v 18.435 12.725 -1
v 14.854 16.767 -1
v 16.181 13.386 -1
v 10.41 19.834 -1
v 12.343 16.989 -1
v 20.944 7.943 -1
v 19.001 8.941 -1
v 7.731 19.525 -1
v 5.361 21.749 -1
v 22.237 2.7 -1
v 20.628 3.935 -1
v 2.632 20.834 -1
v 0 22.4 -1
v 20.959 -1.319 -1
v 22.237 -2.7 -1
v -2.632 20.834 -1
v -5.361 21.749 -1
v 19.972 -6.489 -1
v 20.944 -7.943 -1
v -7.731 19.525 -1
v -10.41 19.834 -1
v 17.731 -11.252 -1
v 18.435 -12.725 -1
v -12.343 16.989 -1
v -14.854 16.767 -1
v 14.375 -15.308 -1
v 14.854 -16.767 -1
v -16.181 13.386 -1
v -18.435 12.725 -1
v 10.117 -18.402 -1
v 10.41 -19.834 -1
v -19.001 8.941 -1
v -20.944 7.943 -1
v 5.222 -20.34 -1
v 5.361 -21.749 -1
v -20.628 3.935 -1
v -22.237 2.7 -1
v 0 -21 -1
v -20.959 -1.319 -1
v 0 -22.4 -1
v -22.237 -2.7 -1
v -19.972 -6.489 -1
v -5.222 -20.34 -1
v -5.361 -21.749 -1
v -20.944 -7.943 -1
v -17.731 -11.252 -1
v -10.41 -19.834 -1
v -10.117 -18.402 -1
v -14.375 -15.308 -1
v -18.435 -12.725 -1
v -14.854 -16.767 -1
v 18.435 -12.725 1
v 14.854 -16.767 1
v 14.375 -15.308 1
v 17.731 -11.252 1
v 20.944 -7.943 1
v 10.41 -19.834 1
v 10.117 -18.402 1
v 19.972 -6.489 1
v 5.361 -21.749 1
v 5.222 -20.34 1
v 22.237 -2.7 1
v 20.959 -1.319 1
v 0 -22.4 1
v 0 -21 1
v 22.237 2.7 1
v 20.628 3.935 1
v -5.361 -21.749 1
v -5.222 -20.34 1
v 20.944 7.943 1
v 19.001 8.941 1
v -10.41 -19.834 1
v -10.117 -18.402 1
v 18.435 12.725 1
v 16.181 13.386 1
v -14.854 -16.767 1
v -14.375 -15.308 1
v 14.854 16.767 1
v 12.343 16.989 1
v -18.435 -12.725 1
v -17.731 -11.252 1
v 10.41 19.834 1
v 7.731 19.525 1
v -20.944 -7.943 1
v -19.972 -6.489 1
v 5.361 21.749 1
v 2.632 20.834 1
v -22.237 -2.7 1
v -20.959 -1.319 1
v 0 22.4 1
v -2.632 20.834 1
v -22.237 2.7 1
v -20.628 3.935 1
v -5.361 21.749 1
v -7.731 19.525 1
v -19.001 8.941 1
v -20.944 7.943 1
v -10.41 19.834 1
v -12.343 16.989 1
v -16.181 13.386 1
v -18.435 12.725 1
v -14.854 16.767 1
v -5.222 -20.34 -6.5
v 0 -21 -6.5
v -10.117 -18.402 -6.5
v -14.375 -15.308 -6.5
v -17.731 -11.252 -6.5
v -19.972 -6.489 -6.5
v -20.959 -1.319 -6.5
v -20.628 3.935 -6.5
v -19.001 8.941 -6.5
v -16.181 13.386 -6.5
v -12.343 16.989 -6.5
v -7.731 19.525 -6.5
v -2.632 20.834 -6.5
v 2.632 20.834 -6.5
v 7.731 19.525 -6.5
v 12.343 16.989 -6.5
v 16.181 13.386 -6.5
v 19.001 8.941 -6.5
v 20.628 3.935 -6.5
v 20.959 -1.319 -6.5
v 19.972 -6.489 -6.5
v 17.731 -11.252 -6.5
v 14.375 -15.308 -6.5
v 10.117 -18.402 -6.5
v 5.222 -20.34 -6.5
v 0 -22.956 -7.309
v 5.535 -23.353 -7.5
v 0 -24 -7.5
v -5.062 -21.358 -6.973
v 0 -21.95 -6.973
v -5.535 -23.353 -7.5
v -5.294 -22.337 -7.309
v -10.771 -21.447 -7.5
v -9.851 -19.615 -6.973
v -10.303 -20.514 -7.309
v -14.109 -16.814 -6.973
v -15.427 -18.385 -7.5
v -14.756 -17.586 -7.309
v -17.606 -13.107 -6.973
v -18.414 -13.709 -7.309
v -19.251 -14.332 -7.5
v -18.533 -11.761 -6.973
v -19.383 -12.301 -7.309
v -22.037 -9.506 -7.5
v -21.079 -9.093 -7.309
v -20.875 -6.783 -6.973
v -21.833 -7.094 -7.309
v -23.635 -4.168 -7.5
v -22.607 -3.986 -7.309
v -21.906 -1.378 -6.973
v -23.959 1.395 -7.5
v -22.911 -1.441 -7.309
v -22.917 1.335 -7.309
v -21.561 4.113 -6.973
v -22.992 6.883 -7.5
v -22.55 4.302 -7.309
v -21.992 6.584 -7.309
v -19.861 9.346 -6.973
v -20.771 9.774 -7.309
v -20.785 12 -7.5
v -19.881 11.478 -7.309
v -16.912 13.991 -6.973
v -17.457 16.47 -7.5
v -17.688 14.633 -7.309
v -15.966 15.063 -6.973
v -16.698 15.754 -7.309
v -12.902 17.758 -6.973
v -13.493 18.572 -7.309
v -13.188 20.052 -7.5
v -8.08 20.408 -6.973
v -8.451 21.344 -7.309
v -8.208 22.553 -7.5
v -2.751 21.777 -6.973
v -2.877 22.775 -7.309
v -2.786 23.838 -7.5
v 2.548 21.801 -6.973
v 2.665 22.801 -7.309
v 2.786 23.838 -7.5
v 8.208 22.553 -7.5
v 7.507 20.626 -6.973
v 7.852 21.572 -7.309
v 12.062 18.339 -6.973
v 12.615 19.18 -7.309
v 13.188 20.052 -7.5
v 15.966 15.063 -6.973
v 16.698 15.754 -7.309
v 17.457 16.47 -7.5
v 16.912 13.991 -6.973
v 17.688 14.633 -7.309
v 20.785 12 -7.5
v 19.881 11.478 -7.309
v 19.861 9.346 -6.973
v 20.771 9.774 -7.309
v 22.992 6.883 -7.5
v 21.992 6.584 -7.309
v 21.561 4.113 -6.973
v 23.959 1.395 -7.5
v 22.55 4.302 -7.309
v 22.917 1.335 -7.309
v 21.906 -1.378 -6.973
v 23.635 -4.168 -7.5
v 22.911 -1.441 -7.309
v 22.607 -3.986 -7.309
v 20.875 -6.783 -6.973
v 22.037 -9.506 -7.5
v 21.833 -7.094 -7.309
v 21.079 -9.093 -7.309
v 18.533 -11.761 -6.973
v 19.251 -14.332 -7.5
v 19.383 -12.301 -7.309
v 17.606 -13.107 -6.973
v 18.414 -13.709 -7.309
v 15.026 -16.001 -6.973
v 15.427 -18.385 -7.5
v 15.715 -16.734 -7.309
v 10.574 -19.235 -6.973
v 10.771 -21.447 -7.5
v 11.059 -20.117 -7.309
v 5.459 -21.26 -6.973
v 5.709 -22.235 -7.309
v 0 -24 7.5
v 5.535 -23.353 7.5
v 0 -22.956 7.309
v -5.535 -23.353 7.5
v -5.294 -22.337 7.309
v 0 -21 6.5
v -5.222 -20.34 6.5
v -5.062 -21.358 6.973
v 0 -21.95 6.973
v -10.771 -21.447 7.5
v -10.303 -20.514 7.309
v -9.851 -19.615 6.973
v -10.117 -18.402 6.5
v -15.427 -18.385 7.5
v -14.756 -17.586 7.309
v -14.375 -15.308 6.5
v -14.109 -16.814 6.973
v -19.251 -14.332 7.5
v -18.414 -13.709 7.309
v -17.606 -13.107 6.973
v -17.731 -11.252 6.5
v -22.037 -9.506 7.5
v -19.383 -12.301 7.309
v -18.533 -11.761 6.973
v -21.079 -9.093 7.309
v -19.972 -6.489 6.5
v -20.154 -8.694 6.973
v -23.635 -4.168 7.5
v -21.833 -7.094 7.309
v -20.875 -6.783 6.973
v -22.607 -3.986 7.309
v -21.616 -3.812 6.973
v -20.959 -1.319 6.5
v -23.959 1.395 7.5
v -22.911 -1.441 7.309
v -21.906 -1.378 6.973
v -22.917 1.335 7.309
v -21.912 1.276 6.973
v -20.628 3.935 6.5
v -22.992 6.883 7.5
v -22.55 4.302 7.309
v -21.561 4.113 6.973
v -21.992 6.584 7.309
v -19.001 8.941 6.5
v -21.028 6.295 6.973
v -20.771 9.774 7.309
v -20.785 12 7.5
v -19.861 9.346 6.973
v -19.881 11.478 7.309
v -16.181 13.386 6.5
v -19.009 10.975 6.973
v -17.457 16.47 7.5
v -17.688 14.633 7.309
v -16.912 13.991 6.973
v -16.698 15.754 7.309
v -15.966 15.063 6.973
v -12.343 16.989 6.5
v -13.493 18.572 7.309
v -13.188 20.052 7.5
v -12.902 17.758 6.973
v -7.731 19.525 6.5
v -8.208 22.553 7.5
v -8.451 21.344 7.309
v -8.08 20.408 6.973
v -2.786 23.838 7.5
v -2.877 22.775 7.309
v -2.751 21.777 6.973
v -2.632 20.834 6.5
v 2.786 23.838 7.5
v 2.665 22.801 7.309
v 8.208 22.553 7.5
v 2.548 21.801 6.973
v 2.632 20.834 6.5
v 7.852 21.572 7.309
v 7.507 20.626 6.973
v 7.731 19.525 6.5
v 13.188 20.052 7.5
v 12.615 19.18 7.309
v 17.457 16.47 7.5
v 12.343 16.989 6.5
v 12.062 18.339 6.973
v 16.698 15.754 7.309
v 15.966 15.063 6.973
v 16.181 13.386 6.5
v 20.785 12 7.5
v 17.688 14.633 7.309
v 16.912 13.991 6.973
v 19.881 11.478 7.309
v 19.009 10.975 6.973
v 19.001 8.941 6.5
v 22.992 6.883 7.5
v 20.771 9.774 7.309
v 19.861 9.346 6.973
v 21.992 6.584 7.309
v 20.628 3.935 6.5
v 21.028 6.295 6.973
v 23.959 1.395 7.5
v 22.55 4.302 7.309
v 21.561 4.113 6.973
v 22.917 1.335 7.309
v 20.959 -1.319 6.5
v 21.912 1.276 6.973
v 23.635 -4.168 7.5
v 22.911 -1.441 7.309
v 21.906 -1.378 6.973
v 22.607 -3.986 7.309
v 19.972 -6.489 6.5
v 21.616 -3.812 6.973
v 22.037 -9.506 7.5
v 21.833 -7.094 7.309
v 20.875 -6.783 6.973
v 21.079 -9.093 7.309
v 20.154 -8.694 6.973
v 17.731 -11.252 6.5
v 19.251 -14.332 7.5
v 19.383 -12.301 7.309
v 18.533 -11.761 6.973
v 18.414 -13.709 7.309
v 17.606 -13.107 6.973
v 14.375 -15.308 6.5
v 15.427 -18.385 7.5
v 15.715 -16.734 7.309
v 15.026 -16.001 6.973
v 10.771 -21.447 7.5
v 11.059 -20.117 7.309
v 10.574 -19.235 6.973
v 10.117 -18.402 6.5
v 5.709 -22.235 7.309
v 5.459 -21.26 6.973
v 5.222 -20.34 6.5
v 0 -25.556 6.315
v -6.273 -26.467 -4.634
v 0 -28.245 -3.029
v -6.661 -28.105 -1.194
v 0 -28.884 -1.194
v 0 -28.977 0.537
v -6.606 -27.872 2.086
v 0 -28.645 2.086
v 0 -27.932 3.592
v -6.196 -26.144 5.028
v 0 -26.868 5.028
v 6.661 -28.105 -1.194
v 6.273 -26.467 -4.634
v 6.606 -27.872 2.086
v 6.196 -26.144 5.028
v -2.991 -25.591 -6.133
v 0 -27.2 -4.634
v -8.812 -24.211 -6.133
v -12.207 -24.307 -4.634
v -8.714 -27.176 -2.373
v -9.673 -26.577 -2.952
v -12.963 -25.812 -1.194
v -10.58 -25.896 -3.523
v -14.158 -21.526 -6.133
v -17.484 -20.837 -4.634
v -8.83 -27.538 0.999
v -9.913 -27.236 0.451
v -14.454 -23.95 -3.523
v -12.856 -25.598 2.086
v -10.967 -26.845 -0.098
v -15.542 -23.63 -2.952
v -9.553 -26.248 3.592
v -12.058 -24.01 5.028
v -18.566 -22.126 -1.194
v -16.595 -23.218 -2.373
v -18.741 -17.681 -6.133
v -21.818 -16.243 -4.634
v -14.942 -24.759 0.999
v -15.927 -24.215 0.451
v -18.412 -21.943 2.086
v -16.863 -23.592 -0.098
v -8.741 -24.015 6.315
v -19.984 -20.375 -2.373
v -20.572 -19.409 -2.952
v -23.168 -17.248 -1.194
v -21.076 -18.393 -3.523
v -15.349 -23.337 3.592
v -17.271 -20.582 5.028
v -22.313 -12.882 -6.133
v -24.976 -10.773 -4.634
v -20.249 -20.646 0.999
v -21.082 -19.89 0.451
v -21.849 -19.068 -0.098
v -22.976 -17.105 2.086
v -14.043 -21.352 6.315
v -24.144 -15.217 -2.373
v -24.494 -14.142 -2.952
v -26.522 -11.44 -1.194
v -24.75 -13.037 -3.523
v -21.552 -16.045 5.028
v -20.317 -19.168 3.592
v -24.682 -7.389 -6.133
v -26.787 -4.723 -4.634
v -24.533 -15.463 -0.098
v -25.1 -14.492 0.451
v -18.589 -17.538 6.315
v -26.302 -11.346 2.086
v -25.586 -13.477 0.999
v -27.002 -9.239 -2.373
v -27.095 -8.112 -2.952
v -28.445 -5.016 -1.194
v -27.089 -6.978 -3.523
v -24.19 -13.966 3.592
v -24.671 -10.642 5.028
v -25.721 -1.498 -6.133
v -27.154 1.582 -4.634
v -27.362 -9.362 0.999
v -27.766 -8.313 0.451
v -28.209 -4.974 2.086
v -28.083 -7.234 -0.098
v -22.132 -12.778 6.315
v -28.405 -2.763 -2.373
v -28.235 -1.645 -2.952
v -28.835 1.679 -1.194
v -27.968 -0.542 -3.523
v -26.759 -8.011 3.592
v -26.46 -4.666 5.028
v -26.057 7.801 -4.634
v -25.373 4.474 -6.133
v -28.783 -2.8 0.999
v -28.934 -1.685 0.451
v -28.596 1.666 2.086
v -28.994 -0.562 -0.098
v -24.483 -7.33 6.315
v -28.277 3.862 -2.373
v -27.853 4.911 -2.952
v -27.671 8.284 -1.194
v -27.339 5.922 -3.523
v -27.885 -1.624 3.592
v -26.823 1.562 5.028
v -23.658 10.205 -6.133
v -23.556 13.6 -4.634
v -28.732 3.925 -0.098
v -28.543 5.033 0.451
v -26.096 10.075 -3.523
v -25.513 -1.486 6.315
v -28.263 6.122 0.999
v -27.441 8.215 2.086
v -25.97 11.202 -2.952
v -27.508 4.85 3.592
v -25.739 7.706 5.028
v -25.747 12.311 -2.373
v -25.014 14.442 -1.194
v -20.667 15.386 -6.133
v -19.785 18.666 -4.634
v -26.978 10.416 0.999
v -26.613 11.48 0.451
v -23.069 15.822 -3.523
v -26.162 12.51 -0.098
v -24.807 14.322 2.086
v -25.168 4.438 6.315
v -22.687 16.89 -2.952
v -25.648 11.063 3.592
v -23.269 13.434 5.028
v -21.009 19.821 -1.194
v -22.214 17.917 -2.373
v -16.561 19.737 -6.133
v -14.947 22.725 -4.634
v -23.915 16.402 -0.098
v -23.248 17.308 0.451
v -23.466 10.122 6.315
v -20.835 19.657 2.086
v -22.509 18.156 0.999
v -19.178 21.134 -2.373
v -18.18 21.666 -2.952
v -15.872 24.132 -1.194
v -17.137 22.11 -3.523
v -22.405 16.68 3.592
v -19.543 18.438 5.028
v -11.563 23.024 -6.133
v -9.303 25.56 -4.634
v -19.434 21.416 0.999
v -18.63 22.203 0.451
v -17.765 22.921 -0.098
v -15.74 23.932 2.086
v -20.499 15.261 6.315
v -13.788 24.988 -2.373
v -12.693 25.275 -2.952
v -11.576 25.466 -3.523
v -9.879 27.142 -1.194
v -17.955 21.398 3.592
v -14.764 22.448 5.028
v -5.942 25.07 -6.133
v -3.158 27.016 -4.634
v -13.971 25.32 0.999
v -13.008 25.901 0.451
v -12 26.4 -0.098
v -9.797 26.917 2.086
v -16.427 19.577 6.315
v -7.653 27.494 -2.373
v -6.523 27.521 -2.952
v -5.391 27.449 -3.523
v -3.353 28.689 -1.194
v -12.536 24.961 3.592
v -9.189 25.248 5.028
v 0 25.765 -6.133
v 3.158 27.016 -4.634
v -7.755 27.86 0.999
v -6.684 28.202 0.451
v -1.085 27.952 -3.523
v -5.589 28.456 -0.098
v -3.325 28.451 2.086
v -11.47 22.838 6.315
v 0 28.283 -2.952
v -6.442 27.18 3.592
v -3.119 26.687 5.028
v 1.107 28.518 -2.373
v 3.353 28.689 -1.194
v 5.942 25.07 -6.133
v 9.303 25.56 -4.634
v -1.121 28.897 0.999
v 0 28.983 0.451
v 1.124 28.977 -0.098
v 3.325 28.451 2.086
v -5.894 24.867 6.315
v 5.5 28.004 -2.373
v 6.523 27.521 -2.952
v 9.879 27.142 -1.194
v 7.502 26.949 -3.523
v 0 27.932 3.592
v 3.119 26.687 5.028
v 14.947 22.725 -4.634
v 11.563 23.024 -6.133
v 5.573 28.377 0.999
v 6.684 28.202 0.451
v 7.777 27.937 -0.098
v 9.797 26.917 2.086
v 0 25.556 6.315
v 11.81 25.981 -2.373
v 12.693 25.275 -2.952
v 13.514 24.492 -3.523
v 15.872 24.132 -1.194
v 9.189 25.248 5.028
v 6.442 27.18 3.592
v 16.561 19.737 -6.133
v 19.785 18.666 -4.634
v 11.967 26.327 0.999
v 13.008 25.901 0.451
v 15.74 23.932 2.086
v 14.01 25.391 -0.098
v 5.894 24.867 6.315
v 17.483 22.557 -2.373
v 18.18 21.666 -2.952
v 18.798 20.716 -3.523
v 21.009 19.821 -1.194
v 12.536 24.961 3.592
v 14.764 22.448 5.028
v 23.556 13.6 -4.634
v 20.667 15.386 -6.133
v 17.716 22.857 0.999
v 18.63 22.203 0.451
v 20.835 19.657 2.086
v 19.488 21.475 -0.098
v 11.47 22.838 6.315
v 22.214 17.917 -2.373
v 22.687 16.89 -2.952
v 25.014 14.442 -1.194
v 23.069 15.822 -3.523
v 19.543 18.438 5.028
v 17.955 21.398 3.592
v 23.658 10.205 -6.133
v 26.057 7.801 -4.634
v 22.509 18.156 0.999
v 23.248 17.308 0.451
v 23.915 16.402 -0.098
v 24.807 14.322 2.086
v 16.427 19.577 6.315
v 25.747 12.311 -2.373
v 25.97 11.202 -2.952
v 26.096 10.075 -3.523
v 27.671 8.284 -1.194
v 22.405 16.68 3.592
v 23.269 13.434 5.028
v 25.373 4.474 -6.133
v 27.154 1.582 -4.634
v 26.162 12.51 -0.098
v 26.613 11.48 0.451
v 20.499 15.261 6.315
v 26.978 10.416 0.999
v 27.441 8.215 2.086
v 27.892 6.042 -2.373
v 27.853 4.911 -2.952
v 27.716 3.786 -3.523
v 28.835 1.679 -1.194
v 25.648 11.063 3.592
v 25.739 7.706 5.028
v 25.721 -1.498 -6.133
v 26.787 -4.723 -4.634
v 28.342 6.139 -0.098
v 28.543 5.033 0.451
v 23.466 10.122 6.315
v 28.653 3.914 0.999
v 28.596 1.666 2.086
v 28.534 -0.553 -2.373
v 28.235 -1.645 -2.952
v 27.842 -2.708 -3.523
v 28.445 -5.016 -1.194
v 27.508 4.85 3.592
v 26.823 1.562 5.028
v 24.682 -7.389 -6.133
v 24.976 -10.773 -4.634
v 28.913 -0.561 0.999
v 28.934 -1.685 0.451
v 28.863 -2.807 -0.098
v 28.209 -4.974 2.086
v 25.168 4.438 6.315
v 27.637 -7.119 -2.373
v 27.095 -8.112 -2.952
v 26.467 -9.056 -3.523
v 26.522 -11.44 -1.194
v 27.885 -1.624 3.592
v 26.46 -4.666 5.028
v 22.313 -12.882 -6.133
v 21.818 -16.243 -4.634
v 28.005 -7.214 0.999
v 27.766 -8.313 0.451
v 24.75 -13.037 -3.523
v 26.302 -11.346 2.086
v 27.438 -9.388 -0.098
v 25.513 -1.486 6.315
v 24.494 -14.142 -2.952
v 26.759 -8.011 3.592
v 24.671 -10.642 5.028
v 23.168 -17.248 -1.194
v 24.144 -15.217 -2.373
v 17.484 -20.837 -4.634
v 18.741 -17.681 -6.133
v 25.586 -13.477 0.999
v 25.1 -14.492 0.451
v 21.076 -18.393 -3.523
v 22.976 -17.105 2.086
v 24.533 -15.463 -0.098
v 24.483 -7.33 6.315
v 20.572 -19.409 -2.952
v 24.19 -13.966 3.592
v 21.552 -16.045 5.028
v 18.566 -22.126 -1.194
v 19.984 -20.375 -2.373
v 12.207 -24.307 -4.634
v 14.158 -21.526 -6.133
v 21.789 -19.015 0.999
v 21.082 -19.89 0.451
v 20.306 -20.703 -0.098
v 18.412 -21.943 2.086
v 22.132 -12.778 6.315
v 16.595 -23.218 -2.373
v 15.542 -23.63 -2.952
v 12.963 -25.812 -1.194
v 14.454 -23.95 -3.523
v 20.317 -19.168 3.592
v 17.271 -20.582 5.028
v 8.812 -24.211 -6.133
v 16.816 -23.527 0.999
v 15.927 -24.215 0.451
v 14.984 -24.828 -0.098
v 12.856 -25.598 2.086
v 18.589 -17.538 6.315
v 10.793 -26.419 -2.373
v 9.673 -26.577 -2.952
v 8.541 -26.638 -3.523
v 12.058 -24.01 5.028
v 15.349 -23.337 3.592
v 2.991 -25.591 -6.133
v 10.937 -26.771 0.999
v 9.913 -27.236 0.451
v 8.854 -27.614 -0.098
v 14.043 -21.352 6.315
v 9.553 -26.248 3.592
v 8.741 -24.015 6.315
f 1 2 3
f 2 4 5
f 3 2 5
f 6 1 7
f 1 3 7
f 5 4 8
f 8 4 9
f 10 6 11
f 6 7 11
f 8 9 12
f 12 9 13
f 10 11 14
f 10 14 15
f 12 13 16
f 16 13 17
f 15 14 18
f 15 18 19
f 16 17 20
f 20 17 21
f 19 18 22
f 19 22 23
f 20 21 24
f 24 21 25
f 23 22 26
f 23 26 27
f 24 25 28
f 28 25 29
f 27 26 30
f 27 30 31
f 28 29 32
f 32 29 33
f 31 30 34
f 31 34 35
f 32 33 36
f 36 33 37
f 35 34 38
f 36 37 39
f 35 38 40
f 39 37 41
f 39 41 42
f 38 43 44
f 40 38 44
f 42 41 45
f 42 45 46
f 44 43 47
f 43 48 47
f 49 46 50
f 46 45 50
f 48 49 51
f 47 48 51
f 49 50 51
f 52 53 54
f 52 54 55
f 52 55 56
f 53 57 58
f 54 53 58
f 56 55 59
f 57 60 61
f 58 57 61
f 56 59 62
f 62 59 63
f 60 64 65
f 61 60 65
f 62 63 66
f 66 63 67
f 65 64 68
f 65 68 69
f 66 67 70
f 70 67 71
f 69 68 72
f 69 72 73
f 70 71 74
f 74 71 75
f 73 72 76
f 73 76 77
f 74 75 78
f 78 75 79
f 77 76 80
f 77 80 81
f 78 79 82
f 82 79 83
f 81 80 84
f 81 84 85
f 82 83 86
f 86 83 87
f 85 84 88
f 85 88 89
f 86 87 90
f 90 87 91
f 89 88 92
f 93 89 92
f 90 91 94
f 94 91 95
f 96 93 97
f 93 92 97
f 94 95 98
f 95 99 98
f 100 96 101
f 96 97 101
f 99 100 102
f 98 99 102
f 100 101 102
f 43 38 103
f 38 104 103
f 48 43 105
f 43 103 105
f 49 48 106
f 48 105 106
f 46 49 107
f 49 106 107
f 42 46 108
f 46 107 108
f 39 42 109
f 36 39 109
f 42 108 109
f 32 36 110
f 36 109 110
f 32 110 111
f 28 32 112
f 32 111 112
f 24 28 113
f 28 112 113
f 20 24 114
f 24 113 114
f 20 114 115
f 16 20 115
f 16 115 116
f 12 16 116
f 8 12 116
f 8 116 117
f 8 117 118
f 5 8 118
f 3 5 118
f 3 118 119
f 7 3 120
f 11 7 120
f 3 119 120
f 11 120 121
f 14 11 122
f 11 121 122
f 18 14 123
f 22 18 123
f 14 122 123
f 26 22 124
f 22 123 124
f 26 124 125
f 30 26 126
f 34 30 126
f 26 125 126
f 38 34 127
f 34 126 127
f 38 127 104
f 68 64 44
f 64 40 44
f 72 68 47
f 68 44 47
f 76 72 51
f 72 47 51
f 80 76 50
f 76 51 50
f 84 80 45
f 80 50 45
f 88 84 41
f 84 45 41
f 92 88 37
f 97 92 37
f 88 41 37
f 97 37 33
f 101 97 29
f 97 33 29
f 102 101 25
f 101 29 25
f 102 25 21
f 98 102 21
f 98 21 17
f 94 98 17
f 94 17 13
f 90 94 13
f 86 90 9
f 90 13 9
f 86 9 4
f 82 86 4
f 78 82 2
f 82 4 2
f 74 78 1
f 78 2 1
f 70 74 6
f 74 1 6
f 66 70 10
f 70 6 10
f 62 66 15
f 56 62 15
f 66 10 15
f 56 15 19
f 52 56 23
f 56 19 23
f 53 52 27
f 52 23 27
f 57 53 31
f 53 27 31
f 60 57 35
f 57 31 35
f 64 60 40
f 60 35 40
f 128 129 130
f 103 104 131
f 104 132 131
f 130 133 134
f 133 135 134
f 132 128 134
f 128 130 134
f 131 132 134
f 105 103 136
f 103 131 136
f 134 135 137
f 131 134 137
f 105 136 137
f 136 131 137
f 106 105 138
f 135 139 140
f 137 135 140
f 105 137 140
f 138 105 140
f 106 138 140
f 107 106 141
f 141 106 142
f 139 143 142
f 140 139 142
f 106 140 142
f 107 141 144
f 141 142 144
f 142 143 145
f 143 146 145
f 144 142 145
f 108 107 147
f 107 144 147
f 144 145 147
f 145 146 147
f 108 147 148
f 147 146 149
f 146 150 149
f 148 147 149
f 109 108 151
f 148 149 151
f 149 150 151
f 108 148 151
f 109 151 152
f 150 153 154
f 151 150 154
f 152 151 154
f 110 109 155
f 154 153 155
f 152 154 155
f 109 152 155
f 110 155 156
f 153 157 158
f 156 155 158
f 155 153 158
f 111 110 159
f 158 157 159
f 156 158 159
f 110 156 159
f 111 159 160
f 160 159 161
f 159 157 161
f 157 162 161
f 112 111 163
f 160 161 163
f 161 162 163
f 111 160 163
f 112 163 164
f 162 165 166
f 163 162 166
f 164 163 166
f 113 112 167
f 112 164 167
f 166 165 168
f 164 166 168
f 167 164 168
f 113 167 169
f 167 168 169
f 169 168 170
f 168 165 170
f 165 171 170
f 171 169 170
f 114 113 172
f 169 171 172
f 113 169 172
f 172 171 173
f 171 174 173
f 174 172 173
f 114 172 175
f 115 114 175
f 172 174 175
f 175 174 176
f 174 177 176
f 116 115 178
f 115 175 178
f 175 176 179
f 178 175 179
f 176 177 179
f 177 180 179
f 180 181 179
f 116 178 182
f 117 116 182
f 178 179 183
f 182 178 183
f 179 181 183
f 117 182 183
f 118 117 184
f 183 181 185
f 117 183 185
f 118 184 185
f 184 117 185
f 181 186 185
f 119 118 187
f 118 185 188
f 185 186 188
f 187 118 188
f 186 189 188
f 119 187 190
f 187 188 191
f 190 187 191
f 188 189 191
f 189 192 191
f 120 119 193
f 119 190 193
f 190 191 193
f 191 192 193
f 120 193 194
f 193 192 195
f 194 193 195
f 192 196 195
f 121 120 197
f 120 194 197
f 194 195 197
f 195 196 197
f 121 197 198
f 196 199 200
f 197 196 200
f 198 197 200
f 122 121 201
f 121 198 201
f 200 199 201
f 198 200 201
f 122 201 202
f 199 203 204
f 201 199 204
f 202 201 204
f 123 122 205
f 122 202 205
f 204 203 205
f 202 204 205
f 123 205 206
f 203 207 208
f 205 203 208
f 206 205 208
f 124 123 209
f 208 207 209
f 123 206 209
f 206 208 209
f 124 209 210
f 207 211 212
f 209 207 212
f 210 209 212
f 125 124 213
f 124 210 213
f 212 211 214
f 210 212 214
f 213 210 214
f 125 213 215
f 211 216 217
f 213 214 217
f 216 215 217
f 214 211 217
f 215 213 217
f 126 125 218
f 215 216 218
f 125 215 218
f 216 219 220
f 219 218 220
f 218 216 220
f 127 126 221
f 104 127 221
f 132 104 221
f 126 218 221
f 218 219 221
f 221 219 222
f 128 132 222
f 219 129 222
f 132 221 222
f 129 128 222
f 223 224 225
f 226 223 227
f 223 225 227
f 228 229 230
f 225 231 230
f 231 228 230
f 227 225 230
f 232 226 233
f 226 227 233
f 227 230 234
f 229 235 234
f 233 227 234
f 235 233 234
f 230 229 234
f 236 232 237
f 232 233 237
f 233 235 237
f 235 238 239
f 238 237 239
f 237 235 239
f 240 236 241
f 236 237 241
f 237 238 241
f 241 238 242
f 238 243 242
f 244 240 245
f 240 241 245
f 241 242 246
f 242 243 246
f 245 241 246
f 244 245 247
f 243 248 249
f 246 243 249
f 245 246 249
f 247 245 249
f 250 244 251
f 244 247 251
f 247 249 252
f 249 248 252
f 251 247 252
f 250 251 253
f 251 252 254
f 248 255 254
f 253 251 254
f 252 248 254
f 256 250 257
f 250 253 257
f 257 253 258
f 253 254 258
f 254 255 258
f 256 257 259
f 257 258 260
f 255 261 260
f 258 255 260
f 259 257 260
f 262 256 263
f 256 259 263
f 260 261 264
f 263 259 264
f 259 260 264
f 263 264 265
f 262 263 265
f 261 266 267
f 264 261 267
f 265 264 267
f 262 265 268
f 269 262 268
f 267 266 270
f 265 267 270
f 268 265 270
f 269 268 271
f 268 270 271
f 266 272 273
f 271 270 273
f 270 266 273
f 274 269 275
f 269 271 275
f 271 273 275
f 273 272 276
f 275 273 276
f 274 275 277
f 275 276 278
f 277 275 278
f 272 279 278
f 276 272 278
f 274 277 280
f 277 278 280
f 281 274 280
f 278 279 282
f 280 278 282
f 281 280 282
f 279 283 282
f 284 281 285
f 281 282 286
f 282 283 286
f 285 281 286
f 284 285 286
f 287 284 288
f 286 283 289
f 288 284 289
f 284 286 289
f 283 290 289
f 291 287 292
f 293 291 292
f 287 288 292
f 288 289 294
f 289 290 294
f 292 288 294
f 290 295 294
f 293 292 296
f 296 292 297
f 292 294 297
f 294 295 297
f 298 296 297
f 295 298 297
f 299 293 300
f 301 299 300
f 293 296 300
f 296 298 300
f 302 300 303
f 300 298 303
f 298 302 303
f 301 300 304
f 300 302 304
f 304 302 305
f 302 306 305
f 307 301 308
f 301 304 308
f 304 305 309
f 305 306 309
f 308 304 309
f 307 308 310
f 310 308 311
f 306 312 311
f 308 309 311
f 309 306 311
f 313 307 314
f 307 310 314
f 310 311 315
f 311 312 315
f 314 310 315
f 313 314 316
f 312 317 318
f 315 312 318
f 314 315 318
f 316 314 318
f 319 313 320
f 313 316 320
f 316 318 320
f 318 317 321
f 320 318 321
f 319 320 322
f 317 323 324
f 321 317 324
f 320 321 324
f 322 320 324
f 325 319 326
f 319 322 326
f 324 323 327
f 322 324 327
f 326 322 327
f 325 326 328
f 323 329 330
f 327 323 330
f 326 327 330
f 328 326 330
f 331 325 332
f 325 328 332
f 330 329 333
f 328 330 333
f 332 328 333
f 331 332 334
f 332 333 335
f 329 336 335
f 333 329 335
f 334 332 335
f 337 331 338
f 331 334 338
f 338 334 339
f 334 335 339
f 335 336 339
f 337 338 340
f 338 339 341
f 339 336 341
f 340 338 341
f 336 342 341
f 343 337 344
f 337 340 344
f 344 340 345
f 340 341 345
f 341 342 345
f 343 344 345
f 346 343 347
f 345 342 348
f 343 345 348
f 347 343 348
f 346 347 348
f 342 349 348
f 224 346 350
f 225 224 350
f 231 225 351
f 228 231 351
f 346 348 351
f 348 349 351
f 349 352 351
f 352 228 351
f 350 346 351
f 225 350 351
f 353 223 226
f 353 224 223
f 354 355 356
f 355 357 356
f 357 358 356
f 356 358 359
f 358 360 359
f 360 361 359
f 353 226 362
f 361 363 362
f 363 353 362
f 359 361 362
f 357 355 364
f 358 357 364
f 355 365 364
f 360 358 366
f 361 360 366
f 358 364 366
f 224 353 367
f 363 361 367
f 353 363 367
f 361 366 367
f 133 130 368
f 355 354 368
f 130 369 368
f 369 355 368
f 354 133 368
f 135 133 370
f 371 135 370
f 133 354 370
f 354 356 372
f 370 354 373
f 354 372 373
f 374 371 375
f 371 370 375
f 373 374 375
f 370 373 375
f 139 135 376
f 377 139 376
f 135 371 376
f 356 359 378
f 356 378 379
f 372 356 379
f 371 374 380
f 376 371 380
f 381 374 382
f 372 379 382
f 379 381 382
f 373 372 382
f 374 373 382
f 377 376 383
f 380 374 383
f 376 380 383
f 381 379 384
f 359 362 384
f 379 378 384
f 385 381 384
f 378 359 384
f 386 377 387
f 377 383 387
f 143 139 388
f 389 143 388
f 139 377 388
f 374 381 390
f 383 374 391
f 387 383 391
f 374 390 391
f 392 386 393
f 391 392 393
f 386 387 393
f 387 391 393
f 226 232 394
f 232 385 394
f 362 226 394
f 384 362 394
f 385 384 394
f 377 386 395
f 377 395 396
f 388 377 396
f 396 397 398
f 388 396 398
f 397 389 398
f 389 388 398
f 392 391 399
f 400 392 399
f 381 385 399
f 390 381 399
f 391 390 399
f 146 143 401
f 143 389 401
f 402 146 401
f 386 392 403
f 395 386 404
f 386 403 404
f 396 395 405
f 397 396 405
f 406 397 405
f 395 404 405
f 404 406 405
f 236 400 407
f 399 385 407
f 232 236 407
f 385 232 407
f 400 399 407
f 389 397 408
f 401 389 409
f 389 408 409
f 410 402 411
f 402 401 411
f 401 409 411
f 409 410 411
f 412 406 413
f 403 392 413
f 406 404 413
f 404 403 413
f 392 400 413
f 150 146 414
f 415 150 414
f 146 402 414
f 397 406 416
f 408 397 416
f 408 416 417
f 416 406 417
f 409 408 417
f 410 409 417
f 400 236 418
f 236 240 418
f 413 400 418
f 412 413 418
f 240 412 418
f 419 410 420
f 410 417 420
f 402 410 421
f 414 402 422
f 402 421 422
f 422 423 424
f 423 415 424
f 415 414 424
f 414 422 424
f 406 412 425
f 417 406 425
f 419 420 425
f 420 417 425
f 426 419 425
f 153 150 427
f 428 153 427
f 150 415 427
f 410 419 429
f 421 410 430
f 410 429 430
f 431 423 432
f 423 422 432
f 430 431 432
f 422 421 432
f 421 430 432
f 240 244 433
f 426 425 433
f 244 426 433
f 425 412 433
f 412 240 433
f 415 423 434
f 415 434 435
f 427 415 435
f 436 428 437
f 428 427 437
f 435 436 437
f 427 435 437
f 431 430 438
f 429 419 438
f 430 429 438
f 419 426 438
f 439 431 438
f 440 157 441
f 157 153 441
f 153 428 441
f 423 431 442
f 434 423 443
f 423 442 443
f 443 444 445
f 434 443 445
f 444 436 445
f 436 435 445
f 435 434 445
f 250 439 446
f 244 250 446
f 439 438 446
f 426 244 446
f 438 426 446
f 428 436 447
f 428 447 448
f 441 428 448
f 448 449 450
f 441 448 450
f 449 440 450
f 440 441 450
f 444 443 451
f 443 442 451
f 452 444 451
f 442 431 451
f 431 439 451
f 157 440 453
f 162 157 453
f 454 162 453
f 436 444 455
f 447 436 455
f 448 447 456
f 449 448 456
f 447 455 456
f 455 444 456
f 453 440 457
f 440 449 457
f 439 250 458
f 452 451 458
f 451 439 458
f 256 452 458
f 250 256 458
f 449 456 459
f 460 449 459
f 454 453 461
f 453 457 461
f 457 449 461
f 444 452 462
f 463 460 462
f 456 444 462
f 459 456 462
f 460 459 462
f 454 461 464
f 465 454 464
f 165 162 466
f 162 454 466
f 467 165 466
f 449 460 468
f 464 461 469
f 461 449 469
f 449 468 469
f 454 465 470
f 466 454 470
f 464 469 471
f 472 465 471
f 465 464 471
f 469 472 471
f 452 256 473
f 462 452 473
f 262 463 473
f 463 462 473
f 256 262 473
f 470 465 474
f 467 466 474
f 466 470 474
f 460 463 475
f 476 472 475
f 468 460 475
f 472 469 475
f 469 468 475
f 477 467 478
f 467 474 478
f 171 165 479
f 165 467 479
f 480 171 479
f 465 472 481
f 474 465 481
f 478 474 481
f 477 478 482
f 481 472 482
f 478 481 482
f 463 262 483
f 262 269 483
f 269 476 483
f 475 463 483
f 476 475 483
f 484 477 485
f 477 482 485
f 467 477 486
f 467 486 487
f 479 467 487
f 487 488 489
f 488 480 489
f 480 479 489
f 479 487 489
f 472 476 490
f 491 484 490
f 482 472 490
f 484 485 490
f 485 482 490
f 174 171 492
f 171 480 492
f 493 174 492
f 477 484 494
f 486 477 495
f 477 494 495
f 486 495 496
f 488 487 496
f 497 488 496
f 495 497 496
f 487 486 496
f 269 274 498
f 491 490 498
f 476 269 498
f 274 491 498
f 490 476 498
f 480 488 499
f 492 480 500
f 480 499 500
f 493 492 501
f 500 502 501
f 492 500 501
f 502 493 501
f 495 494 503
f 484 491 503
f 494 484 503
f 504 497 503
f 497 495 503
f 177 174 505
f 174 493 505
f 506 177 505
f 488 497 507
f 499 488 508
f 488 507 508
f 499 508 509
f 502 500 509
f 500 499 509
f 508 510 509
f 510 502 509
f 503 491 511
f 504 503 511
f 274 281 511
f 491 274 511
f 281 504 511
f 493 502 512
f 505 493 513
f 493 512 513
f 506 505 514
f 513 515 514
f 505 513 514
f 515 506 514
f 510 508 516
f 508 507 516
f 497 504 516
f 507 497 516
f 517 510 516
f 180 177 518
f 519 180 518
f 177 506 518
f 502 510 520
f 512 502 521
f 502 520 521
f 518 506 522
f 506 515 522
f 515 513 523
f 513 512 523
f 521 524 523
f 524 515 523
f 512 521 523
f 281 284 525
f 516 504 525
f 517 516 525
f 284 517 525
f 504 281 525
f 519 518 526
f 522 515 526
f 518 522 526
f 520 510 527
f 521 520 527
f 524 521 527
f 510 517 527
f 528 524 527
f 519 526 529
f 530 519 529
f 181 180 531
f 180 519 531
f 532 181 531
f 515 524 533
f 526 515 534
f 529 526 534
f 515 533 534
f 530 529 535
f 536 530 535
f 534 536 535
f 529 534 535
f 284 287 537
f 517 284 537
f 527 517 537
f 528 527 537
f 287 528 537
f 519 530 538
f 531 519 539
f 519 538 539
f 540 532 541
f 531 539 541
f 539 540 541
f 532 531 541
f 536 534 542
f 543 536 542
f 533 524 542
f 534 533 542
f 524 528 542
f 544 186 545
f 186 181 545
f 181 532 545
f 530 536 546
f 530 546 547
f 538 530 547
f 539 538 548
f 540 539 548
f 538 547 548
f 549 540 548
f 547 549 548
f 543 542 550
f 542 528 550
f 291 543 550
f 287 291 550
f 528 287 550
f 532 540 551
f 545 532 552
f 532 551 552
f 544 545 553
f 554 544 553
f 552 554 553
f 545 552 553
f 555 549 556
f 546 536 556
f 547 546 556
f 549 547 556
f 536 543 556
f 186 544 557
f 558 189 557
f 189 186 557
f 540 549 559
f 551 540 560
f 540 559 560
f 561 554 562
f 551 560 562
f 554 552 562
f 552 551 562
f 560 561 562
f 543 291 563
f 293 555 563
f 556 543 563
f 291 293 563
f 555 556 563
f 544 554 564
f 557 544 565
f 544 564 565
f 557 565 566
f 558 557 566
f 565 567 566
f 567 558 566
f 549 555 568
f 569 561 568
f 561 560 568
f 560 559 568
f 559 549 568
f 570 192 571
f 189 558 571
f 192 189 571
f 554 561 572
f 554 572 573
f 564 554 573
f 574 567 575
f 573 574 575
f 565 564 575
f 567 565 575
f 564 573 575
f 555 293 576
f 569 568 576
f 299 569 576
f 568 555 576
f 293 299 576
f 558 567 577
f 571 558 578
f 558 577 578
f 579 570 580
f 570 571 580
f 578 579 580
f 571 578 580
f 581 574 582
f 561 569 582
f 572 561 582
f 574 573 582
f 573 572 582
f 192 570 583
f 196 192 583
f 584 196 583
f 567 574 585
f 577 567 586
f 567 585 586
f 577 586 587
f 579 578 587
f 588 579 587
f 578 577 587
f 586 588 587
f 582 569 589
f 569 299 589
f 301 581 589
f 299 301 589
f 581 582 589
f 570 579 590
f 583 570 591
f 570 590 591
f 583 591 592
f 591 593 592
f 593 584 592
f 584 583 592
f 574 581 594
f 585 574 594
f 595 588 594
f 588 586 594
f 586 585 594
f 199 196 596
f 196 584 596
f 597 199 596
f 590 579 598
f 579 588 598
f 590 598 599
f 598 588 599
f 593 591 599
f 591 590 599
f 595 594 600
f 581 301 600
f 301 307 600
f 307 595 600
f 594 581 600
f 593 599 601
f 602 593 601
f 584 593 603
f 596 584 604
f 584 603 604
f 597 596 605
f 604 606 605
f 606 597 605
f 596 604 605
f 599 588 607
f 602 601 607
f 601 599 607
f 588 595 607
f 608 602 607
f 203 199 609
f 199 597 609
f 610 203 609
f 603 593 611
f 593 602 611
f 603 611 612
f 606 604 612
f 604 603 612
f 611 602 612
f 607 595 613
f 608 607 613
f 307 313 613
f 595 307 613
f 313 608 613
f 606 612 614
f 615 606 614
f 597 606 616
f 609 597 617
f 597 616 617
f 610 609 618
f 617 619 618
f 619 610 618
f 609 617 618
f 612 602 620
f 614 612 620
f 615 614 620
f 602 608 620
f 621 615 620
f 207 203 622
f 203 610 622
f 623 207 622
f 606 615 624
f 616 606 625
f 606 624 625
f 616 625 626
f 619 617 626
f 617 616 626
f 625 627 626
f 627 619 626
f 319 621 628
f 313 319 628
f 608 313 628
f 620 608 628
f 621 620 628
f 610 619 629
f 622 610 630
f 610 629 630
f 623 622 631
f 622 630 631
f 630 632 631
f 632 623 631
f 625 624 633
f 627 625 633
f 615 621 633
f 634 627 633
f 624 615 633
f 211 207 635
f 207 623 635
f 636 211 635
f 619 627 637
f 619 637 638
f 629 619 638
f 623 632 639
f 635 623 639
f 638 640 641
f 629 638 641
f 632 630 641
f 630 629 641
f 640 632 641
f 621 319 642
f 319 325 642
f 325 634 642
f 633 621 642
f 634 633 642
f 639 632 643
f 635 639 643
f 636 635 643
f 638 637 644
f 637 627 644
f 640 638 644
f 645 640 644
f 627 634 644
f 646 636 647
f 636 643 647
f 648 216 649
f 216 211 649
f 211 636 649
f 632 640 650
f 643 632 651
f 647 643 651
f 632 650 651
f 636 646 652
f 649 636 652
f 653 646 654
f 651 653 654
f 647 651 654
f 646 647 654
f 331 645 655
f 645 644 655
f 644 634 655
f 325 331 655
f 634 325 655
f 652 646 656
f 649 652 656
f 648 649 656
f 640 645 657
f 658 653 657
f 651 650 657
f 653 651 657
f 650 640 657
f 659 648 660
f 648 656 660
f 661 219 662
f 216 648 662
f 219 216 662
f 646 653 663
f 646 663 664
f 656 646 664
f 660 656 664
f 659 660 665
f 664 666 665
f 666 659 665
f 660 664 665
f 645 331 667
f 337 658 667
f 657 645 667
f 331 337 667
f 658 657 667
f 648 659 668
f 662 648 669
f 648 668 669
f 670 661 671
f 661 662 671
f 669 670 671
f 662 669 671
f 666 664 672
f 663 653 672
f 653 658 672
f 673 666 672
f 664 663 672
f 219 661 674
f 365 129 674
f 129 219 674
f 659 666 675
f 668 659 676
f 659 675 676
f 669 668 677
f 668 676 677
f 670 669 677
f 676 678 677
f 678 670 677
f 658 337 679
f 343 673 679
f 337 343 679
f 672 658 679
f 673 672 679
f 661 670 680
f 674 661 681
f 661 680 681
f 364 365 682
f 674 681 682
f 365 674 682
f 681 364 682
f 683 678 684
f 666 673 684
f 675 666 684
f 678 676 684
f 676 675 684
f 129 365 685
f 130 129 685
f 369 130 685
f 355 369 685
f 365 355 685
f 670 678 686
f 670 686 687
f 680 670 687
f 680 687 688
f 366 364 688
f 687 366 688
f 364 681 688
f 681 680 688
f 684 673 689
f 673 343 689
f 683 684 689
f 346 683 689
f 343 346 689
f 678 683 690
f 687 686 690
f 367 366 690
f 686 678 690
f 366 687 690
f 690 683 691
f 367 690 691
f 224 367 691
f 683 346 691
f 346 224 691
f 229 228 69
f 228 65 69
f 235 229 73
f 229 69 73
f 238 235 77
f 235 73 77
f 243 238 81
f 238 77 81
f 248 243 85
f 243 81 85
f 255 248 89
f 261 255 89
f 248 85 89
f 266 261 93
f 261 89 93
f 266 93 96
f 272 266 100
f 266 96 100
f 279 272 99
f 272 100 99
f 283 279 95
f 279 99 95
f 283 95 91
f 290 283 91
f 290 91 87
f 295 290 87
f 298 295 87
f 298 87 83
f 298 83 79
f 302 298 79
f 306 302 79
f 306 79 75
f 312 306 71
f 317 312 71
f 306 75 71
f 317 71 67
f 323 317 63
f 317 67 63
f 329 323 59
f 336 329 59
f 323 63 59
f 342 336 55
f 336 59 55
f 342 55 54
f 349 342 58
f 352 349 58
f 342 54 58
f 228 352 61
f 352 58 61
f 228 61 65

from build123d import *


with BuildPart() as part:
    # Sketch3 → Revolve1 (revolve)
    with BuildSketch(Plane(origin=(0, 0, 0), x_dir=(0, 0, -1), z_dir=(1, 0, 0)), mode=Mode.PRIVATE) as revolve1_sk:
        with BuildLine():
            Line((-6.5, 21), (-1, 21))
            Line((-1, 21), (-1, 22.4))
            Line((-1, 22.4), (1, 22.4))
            Line((1, 22.4), (1, 21))
            Line((1, 21), (6.5, 21))
            ThreePointArc((6.5, 21), (7.158910532, 22.447029823), (7.5, 24))
            add(Edge.make_bspline(
                [(7.5, 24), (0, 35.041666667), (-7.5, 24)],
                knots=[5.687182868, 5.687182868, 5.687182868, 6.879187746, 6.879187746, 6.879187746], degree=2, weights=[1, 0.827586207, 1]))
            ThreePointArc((-7.5, 24), (-7.158910532, 22.447029823), (-6.5, 21))
        make_face()
    revolve(revolve1_sk.sketch.rotate(Axis((0, 0, 13.360918791), (0, 0, -1)), 180), axis=Axis((0, 0, 13.360918791), (0, 0, -1)))


solid = part.part
